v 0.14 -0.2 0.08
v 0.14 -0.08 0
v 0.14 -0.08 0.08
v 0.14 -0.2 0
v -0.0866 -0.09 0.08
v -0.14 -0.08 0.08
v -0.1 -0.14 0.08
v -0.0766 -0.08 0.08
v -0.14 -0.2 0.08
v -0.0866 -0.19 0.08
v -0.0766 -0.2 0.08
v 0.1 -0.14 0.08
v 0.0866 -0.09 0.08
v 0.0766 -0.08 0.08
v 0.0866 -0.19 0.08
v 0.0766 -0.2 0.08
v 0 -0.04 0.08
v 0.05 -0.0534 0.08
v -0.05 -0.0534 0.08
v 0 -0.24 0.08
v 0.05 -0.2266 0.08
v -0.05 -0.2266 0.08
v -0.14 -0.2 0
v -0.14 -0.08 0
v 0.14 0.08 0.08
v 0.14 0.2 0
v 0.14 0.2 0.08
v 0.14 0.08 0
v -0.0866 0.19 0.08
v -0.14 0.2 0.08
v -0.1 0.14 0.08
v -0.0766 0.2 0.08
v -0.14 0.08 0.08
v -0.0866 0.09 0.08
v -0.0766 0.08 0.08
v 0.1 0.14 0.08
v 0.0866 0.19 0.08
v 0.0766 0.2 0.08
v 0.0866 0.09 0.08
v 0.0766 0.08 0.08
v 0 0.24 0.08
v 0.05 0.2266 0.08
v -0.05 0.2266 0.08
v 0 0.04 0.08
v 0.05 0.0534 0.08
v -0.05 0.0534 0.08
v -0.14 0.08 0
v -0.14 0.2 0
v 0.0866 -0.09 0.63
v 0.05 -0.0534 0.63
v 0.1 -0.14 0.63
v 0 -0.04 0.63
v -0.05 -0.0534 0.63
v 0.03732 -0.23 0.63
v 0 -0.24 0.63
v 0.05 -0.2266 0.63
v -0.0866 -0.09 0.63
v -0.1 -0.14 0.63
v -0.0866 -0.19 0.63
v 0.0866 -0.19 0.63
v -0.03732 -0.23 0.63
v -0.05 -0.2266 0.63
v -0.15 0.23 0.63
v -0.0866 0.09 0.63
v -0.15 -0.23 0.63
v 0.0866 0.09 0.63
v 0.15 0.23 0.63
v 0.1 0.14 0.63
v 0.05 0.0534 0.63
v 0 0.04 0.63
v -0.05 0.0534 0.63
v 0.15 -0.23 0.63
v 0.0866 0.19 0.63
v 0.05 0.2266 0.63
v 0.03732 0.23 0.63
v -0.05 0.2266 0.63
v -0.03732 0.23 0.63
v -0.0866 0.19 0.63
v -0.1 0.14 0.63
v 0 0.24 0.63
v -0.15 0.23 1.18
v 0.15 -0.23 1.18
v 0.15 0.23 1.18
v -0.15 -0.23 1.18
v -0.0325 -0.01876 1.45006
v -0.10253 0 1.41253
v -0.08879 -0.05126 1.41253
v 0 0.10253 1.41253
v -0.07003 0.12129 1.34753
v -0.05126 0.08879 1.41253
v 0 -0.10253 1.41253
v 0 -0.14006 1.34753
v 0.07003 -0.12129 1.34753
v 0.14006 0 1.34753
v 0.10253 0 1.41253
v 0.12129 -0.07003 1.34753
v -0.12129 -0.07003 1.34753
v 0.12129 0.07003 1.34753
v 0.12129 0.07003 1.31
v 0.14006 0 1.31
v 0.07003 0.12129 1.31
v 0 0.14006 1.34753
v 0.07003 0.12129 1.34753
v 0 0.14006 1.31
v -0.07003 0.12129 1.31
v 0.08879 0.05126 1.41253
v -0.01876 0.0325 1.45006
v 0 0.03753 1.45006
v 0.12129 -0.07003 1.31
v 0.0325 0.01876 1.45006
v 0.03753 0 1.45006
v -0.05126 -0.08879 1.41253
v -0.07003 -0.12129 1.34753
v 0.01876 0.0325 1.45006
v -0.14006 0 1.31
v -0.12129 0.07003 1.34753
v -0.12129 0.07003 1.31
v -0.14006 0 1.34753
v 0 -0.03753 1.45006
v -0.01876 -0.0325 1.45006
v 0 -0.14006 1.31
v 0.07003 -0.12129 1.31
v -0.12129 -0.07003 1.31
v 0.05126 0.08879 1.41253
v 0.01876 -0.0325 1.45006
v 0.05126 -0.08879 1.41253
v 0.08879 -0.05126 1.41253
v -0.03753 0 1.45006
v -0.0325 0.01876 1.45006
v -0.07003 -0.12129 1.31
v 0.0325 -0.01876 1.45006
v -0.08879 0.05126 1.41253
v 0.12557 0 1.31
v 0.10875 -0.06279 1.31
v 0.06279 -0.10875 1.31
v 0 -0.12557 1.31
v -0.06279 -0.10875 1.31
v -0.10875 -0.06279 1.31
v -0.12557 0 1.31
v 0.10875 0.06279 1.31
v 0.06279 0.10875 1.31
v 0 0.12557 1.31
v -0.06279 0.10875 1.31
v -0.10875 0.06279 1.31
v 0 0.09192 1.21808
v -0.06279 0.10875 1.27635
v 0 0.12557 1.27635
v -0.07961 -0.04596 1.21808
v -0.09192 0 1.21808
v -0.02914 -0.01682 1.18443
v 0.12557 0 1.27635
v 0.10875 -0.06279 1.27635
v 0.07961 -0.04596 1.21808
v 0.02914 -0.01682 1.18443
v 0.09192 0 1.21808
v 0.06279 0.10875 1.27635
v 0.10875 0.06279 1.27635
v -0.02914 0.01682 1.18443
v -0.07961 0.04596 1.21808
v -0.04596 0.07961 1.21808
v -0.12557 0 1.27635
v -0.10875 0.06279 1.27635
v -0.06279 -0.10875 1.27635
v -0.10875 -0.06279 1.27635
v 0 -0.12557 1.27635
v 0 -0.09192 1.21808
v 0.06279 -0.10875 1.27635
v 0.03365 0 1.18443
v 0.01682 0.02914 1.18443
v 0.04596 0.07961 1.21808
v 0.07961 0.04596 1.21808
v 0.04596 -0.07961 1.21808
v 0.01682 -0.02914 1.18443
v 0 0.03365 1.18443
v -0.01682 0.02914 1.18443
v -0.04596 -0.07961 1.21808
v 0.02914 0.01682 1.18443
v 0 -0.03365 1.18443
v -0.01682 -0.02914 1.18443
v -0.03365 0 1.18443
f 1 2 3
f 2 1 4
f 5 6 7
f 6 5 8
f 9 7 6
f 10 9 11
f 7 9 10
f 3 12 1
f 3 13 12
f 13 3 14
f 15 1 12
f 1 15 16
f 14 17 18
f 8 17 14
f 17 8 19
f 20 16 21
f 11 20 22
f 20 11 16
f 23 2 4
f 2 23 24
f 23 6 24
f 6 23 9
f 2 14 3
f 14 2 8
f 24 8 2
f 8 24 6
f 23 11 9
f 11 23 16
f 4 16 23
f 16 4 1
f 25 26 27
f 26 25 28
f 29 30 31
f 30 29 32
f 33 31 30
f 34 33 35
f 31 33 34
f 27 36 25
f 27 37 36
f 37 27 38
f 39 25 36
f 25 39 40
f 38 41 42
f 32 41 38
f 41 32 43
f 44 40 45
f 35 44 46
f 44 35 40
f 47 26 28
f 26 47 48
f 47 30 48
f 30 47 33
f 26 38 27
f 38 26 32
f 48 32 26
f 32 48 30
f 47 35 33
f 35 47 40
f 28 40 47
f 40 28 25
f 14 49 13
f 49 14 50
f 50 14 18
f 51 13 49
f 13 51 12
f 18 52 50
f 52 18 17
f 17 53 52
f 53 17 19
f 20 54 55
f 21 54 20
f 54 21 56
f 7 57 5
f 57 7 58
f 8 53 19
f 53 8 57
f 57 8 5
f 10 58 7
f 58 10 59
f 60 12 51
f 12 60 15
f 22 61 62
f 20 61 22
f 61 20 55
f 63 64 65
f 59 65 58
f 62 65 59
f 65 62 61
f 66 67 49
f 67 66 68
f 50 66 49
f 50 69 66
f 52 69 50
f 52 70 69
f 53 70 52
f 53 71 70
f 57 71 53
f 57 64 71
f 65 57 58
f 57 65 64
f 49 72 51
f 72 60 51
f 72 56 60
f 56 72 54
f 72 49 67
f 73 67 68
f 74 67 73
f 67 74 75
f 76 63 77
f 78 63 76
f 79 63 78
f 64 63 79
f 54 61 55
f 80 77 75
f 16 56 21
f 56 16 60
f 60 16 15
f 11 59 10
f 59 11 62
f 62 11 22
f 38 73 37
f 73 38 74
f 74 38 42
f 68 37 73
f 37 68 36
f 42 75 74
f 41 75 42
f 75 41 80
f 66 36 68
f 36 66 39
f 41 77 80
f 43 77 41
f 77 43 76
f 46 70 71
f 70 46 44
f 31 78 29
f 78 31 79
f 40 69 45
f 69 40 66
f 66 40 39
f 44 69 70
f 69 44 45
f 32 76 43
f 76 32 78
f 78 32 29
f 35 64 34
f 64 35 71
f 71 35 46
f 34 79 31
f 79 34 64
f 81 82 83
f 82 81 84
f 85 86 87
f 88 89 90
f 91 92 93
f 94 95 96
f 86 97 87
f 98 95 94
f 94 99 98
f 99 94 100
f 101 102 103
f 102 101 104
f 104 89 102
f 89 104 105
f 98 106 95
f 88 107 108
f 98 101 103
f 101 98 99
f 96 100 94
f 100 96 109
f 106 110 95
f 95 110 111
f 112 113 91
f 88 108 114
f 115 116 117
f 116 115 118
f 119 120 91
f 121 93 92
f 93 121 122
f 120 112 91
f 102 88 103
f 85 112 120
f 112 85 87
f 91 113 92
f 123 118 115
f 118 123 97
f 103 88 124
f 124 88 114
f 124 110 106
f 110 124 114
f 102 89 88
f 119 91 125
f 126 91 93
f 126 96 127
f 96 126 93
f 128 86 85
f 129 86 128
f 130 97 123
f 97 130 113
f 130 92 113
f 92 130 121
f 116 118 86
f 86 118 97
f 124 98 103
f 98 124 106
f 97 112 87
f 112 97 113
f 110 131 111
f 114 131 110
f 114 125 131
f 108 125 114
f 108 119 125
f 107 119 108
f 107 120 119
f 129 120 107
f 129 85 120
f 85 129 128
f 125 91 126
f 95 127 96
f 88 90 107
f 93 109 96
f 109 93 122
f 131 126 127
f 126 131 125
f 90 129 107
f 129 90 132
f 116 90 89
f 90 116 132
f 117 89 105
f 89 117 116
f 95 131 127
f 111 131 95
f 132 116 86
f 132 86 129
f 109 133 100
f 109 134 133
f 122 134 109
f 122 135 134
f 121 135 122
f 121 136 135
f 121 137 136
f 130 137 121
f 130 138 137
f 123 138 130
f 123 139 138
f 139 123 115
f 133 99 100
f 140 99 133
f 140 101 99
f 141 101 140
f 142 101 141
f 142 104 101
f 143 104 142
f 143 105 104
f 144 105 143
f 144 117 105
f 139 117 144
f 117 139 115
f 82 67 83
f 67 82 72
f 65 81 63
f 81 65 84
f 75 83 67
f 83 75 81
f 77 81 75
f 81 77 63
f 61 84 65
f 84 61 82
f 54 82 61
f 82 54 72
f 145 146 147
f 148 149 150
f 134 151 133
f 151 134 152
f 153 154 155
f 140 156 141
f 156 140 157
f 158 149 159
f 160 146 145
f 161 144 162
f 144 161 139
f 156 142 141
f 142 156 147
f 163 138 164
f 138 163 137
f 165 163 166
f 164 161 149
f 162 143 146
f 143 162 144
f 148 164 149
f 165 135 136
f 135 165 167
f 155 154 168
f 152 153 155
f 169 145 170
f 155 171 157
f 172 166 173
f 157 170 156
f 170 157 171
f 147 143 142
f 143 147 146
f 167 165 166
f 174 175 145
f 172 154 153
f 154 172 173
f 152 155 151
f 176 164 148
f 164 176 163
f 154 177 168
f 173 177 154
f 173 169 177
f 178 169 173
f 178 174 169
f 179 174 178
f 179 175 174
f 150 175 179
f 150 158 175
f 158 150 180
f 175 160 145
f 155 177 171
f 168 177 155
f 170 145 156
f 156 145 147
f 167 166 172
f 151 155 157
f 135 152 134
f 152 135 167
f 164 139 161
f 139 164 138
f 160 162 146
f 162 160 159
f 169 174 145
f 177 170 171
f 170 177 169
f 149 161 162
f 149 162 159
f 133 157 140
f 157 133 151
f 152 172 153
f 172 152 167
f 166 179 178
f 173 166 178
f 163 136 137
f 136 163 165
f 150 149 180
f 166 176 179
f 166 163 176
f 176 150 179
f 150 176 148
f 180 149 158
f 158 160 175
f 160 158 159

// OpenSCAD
// Walker — same stylised figure as skier.scad but without skis.
// Used for guests who have removed their skis to cross a building
// footprint or bare-ground patch.
//
// Same axis conventions as skier.scad:
//   +X = forward (direction of travel), +Y = lateral (left), +Z = up
//
// Legs start at Z = 0 (ground) instead of ski_top + boot_h.

$fn = 12;

// ── Dimensions (metres) ───────────────────────────────────────────────────
shoe_len = 0.28;
shoe_w   = 0.12;
shoe_h   = 0.08;
shoe_gap = 0.14; // half-distance between feet (narrower than ski stance)

leg_r = 0.10;
leg_h = 0.55;

torso_d = 0.30;
torso_w = 0.46;
torso_h = 0.55;

head_r = 0.13;

arm_r          = 0.07;
arm_h          = 0.55;
arm_shoulder_y = torso_w / 2 - arm_r;

// Z coordinates
shoe_top  = shoe_h;
leg_top   = shoe_top + leg_h;
torso_top = leg_top + torso_h;

// ── Parts ─────────────────────────────────────────────────────────────────
module shoes() {
    color([0.10, 0.10, 0.12])
    for (y = [-shoe_gap, +shoe_gap])
        translate([0, y, shoe_h / 2])
            cube([shoe_len, shoe_w, shoe_h], center = true);
}

module legs() {
    color([0.20, 0.22, 0.30]) // dark pants
    for (y = [-shoe_gap, +shoe_gap])
        translate([0, y, shoe_top + leg_h / 2])
            cylinder(h = leg_h, r = leg_r, center = true);
}

module torso() {
    color([0.85, 0.30, 0.30]) // ski-jacket red
    translate([0, 0, leg_top + torso_h / 2])
        cube([torso_d, torso_w, torso_h], center = true);
}

module arms() {
    color([0.85, 0.30, 0.30]) // matches jacket
    for (y = [-arm_shoulder_y, +arm_shoulder_y])
        translate([0, y, leg_top + torso_h - arm_h / 2])
            cylinder(h = arm_h, r = arm_r, center = true);
}

module head() {
    color([0.95, 0.80, 0.65]) // fair skin
    translate([0, 0, torso_top + head_r])
        sphere(r = head_r);
}

module helmet() {
    color([0.15, 0.15, 0.18])
    translate([0, 0, torso_top + head_r])
        difference() {
            sphere(r = head_r + 0.015);
            translate([0, 0, -head_r])
                cube([head_r * 3, head_r * 3, head_r * 2], center = true);
        }
}

module walker() {
    shoes();
    legs();
    torso();
    arms();
    head();
    helmet();
}

walker();
